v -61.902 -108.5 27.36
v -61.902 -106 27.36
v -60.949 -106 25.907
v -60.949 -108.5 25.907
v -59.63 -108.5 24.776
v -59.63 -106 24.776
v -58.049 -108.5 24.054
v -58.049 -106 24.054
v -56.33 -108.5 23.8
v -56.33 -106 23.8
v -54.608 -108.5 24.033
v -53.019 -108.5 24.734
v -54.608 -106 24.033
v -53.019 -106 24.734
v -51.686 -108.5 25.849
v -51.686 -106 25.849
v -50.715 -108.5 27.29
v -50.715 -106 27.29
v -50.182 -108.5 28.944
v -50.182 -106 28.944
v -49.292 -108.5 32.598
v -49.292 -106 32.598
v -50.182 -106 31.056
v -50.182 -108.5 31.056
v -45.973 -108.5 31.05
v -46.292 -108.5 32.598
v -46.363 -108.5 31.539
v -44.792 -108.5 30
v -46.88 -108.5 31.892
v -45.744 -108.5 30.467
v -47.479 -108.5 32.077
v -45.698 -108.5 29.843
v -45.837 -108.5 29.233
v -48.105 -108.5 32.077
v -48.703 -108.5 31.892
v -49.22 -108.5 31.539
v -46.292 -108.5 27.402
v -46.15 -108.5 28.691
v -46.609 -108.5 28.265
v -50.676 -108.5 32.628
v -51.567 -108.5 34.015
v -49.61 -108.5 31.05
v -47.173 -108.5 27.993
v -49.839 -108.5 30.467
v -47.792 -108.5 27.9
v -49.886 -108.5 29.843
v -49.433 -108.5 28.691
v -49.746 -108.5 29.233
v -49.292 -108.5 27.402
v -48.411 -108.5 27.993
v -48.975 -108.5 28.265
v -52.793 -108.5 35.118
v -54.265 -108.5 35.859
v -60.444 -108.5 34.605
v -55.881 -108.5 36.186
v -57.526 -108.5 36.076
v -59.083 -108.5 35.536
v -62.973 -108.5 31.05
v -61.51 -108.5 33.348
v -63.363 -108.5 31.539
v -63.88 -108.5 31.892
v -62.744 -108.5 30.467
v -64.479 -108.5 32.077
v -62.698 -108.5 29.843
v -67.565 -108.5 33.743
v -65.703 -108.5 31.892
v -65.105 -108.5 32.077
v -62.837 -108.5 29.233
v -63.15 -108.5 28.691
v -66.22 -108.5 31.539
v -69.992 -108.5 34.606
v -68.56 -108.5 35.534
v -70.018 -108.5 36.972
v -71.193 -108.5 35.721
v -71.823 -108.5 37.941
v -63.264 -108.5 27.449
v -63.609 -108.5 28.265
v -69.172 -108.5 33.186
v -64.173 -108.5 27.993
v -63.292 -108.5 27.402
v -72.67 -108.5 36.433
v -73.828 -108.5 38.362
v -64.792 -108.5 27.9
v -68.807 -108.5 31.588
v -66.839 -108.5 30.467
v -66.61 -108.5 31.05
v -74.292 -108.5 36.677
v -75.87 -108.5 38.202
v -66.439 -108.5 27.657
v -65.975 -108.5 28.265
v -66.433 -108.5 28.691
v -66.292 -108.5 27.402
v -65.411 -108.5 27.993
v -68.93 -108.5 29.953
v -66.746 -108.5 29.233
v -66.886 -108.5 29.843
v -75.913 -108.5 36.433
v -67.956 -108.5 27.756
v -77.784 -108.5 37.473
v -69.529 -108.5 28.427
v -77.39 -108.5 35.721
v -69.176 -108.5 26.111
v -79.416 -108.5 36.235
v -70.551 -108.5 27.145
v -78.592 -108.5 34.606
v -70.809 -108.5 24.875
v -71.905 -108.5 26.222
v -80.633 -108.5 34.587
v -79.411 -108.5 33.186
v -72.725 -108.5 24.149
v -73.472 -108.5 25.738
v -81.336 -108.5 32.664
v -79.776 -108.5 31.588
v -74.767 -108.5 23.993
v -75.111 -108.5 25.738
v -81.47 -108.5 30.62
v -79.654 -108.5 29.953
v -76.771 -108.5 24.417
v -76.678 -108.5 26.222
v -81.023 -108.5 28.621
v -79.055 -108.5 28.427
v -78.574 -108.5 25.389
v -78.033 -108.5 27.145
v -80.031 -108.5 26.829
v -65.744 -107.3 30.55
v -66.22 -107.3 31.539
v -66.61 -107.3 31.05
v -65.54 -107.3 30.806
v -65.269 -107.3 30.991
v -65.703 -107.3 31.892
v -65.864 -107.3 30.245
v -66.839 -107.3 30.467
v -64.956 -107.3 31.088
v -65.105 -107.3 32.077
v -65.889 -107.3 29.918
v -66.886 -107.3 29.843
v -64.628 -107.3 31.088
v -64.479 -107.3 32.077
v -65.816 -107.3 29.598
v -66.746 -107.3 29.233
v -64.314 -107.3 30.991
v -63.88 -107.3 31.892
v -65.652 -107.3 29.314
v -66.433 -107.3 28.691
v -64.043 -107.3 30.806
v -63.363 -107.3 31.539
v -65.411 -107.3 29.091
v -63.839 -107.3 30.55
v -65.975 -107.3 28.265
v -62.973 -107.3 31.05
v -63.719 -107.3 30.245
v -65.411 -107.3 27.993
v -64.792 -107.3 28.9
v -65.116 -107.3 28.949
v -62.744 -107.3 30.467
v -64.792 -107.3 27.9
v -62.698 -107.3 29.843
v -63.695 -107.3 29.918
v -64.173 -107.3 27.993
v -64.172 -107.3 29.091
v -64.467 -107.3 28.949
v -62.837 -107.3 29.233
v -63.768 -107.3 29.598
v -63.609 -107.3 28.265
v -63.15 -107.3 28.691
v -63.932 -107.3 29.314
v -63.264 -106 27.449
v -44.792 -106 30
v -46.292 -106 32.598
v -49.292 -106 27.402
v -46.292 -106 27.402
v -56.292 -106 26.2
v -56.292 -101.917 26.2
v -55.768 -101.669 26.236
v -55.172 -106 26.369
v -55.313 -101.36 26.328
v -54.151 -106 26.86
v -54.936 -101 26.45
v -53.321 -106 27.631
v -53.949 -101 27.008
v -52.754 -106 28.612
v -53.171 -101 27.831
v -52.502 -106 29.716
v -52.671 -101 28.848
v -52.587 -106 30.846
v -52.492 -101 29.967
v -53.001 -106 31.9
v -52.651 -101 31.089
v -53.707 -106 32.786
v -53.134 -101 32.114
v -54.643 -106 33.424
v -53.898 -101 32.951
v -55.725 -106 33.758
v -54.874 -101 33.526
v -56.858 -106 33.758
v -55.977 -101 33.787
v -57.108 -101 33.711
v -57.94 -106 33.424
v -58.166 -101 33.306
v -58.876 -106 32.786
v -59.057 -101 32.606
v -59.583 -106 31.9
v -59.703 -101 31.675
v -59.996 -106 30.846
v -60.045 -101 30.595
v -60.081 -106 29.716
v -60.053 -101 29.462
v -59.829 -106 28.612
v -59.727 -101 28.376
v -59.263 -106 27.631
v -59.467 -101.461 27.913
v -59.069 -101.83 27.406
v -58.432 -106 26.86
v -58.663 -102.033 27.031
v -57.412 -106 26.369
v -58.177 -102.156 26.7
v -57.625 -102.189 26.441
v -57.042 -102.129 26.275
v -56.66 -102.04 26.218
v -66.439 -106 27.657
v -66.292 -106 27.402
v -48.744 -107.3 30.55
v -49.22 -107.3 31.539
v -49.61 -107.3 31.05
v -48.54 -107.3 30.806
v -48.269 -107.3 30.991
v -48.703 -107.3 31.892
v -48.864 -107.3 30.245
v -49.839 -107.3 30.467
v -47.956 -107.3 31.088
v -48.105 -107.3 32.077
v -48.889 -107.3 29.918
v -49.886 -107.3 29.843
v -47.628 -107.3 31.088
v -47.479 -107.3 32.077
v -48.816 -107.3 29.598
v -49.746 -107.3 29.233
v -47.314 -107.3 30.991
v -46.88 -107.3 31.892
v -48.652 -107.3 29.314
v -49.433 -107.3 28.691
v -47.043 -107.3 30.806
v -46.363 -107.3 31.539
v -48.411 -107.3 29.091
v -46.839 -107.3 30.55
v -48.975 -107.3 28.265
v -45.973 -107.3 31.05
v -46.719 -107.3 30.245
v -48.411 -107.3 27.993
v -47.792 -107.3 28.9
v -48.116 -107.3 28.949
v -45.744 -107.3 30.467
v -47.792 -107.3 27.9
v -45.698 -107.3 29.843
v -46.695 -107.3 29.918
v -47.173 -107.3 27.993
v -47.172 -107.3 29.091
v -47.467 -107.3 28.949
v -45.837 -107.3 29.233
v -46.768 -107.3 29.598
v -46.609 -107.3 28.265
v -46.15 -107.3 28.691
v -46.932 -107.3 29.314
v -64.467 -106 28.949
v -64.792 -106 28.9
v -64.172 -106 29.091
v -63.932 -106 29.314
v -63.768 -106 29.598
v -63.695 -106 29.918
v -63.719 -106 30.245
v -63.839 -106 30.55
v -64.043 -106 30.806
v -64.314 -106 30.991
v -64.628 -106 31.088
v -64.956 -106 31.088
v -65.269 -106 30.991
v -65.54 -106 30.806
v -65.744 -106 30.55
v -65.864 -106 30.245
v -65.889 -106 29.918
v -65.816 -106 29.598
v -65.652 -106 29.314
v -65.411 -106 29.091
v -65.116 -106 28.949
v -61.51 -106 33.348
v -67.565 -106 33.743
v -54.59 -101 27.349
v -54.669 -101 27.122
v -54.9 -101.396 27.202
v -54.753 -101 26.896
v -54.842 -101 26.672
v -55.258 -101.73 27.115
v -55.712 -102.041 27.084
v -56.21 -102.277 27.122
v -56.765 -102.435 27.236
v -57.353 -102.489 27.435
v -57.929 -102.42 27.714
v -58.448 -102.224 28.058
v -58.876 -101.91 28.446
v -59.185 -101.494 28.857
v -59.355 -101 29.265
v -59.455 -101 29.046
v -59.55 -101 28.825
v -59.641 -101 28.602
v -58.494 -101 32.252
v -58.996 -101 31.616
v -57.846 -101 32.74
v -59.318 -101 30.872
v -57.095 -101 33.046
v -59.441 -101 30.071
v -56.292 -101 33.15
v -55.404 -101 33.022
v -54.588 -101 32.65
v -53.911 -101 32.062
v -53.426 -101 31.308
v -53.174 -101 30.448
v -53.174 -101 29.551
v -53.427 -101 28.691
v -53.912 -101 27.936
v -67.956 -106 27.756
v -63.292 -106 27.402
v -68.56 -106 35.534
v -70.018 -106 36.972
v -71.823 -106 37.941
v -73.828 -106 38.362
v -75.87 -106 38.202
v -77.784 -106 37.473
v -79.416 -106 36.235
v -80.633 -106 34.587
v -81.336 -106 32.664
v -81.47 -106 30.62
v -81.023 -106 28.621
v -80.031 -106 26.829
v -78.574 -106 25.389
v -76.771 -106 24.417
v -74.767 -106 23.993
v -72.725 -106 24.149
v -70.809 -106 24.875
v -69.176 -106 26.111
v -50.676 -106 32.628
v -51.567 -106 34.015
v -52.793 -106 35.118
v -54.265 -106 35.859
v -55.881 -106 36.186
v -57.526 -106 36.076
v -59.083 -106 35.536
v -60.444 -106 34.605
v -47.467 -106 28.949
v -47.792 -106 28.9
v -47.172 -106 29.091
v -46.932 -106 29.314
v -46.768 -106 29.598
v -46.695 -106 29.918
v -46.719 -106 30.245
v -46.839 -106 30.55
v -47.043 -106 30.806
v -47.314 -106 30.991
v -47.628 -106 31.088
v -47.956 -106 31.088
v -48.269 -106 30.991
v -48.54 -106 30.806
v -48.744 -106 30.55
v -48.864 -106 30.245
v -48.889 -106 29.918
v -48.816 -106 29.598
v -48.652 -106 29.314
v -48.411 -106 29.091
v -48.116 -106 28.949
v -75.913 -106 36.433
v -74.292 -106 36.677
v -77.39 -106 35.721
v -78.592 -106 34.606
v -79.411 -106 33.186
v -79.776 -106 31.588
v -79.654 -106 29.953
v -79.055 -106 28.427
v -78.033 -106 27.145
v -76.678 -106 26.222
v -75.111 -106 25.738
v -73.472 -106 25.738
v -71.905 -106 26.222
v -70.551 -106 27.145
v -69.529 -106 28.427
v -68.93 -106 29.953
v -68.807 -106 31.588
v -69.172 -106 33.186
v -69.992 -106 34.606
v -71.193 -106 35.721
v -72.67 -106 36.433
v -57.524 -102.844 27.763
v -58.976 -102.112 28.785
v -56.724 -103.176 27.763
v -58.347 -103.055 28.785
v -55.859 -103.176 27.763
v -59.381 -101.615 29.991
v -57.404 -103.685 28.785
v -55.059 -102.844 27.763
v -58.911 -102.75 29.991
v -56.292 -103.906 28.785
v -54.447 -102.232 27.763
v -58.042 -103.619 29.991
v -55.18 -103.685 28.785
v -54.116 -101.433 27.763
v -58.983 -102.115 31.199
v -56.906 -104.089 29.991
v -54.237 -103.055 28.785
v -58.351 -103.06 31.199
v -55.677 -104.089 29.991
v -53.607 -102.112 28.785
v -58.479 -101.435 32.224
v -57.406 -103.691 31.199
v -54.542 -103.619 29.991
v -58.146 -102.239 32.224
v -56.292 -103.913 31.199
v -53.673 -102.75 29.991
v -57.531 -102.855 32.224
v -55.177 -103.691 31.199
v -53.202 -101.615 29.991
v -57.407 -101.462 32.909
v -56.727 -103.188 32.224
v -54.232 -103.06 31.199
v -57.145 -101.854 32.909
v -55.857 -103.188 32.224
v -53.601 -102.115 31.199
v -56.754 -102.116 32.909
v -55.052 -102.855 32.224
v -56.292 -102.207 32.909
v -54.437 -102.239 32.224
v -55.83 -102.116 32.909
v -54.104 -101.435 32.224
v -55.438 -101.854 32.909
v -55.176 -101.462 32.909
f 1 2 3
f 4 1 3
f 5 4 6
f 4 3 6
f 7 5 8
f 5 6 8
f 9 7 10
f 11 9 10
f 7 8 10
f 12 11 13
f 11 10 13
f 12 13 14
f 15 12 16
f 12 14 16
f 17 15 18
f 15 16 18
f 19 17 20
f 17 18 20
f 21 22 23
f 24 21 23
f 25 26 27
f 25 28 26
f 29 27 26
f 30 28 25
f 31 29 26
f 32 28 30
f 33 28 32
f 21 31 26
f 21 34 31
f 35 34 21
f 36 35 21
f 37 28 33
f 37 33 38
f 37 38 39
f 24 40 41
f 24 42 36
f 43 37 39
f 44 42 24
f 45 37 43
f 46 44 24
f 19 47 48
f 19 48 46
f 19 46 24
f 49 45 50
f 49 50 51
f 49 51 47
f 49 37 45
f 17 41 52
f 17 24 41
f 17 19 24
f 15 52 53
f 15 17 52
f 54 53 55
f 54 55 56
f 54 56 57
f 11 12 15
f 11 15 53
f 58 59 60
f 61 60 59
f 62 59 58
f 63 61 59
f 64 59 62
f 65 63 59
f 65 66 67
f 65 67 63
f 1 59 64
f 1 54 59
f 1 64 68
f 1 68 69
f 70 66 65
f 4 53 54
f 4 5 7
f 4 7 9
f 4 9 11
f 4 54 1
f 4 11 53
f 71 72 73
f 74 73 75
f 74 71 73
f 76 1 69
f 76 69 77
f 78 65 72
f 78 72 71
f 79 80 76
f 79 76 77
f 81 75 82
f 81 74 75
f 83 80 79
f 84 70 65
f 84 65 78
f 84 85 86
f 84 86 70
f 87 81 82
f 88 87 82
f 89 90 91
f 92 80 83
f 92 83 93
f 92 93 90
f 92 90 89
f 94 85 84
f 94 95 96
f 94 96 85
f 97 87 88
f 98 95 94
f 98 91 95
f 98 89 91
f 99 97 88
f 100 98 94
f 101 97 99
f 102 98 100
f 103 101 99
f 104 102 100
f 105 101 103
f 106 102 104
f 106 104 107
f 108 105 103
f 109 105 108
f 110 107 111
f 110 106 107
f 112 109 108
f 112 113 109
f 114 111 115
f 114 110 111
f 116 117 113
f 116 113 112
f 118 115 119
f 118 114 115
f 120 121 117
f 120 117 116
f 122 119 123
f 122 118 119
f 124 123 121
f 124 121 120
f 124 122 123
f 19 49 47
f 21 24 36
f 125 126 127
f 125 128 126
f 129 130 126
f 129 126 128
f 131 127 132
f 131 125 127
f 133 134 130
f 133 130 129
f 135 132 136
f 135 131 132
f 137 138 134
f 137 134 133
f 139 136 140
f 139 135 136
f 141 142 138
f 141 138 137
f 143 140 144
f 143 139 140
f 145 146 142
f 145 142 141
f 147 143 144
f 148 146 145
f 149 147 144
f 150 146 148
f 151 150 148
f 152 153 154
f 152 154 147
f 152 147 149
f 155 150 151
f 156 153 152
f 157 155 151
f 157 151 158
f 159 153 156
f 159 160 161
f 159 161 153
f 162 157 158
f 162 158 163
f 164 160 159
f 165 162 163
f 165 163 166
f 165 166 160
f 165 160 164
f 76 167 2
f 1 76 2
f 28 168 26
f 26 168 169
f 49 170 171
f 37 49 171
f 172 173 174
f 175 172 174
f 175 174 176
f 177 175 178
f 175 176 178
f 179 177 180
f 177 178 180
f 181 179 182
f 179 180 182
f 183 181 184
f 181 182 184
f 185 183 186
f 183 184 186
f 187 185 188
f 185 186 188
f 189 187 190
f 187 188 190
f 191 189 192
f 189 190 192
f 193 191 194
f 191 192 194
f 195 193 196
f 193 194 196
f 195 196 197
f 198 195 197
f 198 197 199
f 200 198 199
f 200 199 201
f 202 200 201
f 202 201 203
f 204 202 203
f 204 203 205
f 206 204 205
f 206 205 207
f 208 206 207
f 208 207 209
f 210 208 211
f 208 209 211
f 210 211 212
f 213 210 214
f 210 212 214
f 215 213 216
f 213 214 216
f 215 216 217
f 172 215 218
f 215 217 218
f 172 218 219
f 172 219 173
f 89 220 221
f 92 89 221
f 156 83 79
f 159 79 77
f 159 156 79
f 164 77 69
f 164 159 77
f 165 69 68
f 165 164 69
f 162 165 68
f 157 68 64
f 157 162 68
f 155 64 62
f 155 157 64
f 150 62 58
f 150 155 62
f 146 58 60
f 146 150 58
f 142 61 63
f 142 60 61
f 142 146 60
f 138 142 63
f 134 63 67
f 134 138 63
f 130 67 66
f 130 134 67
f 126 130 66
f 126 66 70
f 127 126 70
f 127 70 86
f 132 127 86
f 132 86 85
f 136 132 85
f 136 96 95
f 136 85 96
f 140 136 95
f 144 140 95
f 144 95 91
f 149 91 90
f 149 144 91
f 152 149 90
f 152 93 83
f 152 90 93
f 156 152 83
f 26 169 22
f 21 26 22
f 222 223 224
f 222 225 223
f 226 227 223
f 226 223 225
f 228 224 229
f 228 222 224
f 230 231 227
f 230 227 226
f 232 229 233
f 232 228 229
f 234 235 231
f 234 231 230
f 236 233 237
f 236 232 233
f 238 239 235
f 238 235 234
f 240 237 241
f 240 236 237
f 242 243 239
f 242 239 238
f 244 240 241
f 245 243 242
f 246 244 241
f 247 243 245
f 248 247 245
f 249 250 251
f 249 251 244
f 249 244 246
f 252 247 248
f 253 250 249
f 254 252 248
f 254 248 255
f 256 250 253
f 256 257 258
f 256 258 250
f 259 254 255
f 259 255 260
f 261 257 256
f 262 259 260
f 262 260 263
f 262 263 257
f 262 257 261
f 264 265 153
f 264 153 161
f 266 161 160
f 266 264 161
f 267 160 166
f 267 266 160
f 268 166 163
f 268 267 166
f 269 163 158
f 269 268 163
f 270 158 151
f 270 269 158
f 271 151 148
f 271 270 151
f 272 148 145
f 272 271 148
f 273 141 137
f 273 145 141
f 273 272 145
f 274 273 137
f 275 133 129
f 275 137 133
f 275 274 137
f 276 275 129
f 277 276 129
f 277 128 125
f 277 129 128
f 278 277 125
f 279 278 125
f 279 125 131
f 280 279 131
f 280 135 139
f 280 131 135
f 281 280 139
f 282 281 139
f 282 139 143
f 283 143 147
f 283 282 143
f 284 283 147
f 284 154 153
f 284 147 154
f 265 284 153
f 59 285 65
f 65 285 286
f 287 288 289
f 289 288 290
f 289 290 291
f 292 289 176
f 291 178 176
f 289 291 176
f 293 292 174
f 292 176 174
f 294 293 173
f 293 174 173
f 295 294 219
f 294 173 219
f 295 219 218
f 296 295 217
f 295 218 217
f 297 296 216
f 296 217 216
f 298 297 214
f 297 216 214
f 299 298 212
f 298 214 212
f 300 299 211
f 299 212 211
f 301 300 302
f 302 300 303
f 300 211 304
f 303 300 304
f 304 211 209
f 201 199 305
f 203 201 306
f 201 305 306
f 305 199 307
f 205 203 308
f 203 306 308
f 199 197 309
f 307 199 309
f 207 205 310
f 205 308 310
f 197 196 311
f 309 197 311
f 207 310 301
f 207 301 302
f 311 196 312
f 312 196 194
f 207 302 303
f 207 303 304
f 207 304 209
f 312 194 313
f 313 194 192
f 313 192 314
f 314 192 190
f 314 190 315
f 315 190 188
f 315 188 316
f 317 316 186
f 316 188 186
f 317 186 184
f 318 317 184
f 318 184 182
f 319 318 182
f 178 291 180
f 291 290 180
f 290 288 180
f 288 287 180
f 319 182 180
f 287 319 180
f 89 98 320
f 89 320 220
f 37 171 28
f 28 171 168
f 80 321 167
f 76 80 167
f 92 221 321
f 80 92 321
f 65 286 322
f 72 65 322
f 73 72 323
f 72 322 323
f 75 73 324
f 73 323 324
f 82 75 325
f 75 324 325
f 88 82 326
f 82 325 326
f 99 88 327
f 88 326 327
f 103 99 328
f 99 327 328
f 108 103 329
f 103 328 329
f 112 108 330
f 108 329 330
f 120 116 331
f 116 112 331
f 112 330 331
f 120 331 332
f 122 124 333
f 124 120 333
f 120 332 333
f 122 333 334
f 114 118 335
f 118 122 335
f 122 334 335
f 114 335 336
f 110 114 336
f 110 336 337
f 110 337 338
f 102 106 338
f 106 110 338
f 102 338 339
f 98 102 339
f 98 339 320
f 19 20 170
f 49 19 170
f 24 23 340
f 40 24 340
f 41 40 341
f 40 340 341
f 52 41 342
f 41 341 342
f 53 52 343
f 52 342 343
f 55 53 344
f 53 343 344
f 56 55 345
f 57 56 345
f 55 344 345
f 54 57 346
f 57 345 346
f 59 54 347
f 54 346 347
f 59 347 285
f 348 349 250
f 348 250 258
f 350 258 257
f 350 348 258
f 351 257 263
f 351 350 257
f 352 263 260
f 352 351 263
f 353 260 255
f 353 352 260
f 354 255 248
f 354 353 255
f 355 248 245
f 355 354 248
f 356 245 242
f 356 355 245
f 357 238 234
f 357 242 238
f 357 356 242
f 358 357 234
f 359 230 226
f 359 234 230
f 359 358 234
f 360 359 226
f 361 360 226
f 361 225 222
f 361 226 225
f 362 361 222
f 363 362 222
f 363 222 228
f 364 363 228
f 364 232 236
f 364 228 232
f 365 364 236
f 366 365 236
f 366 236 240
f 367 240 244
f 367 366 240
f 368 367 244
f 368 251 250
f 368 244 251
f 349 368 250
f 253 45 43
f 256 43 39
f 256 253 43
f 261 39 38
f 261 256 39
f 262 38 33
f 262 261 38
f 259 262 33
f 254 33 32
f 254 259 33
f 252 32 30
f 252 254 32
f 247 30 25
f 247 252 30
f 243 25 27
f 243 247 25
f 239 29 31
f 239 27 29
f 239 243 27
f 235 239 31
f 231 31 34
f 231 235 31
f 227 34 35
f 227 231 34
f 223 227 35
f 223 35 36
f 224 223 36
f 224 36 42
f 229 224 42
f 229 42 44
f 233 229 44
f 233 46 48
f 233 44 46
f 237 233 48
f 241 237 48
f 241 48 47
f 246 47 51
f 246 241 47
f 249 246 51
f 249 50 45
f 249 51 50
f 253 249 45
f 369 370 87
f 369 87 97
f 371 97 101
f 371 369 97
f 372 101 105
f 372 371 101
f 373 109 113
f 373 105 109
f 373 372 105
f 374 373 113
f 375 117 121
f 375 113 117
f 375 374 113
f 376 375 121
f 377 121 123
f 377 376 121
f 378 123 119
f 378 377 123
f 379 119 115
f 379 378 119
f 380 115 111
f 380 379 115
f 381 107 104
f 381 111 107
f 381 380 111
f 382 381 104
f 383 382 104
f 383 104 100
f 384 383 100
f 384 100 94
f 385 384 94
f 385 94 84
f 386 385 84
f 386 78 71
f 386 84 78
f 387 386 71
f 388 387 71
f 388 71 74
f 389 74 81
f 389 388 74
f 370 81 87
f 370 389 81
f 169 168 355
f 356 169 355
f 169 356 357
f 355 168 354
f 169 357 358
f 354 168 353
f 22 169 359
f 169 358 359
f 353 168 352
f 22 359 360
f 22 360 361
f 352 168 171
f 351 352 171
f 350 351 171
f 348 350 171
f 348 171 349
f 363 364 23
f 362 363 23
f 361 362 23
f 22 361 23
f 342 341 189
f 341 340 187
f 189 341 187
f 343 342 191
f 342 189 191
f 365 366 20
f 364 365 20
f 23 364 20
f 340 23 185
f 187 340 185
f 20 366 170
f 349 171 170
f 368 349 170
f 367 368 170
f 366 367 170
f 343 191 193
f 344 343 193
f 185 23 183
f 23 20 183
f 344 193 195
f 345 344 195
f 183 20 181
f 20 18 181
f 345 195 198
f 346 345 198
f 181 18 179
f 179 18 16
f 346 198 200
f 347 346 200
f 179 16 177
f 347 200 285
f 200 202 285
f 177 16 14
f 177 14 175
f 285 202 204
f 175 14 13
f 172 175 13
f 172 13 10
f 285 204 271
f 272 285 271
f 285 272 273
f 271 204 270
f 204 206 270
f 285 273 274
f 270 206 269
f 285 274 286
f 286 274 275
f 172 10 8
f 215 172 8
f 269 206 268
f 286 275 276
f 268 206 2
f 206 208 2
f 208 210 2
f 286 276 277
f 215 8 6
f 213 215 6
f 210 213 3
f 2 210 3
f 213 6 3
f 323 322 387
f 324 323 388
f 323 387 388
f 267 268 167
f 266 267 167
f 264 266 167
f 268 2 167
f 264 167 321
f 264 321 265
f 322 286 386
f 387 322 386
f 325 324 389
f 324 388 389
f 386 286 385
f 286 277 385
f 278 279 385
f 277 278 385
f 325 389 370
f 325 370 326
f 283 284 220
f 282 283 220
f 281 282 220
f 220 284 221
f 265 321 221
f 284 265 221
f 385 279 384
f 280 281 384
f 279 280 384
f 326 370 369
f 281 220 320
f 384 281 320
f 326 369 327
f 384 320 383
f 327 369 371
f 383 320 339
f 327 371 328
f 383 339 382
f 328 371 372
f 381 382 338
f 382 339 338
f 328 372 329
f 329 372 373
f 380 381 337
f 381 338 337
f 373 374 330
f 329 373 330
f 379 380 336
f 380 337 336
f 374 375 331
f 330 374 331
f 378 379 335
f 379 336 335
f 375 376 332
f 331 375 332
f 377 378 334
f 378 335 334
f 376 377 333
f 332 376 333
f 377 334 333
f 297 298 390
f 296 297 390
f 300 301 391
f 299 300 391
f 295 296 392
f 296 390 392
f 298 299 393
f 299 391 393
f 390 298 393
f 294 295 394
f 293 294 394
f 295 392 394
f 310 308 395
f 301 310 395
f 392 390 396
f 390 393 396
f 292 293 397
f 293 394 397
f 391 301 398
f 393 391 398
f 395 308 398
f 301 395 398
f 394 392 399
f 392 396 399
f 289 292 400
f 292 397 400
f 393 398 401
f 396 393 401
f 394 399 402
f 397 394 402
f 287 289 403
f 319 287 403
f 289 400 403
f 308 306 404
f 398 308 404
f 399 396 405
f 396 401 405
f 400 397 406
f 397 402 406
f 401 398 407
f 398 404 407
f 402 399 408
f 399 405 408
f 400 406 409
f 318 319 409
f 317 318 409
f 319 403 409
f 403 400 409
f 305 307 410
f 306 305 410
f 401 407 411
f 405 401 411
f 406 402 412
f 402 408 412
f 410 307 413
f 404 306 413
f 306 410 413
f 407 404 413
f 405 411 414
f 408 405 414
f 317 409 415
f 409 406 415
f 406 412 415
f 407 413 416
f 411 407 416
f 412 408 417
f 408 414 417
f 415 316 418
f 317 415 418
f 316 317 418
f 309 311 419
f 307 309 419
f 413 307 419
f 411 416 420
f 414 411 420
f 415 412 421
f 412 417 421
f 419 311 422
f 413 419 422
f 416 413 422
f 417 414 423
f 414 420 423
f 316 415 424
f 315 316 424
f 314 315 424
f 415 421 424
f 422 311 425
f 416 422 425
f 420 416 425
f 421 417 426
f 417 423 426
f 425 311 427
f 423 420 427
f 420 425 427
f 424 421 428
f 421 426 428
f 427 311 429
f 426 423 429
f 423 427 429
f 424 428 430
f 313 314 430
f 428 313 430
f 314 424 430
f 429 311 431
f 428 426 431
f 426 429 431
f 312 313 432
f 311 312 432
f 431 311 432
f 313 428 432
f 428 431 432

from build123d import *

# Parameters (mm, degrees)
RETAINER_FEATURE_1_PROFILE_R  = 3.8
RETAINER_FEATURE_1_DEPTH      = 5.02
RETAINER_FEATURE_2_PROFILE_R  = 6.2
RETAINER_FEATURE_2_DEPTH      = 2.5
RETAINER_FEATURE_5_DEPTH      = 2.5
RETAINER_FEATURE_8_DEPTH      = 2.5
RETAINER_FEATURE_12_DEPTH     = 2.5
RETAINER_FEATURE_13_PROFILE_R = 7.2
RETAINER_FEATURE_13_DEPTH     = 2.5
RETAINER_FEATURE_14_PROFILE_R = 5.5
RETAINER_FEATURE_14_DEPTH     = 2.7
RETAINER_FEATURE_15_PROFILE_R = 1.1
RETAINER_FEATURE_15_DEPTH     = 3.75
RETAINER_FEATURE_16_PROFILE_R = 2.1
RETAINER_FEATURE_16_DEPTH     = 1.45
RETAINER_FEATURE_17_PROFILE_R = 1.1
RETAINER_FEATURE_17_DEPTH     = 3.75
RETAINER_FEATURE_18_PROFILE_R = 2.1
RETAINER_FEATURE_18_DEPTH     = 1.45


with BuildPart() as part:
    # Retainer Feature 1 profile → Retainer Feature 1 (new body)
    with BuildSketch(Plane(origin=(0, -101, 0), x_dir=(-1, 0, 0), z_dir=(0, -1, 0))):
        with Locations(Location((56.291651246, -30, 0), (0, 0, 90))):
            Circle(RETAINER_FEATURE_1_PROFILE_R)
    extrude(amount=RETAINER_FEATURE_1_DEPTH)

    # Retainer Feature 2 profile → Retainer Feature 2 (add)
    with BuildSketch(Plane(origin=(0, -106, 0), x_dir=(-1, 0, 0), z_dir=(0, -1, 0))):
        with Locations(Location((56.291651246, -30, 0), (0, 0, 90))):
            Circle(RETAINER_FEATURE_2_PROFILE_R)
    extrude(amount=RETAINER_FEATURE_2_DEPTH)

    # Middle Right Floating Compression Ball R → Retainer Feature 5 (add)
    with BuildSketch(Plane(origin=(0, -106, 0), x_dir=(-1, 0, 0), z_dir=(0, -1, 0))):
        Polygon((44.791651246, -30), (46.291651246, -32.598076211), (49.291651246, -32.598076211), (50.791651246, -30), (49.291651246, -27.401923789), (46.291651246, -27.401923789), align=None)
    extrude(amount=RETAINER_FEATURE_5_DEPTH)

    # Middle Right Floating Compression Ba 2 → Retainer Feature 8 (add)
    with BuildSketch(Plane(origin=(0, -106, 0), x_dir=(-1, 0, 0), z_dir=(0, -1, 0))):
        Polygon((61.791651246, -30), (63.291651246, -32.598076211), (66.291651246, -32.598076211), (67.791651246, -30), (66.291651246, -27.401923789), (63.291651246, -27.401923789), align=None)
    extrude(amount=RETAINER_FEATURE_8_DEPTH)

    # Retainer Feature 9 profile → Retainer Feature 9 (revolve, cut)
    with BuildSketch(Plane(origin=(0, -101, 0), x_dir=(-1, 0, 0), z_dir=(0, -1, 0))):
        with BuildLine():
            Line((56.291651246, -33.15), (56.291651246, -26.85))
            ThreePointArc((56.291651246, -26.85), (53.141651246, -30), (56.291651246, -33.15))
        make_face()
    revolve(axis=Axis((-56.291651246, -101, 20), (0, 0, 1)), mode=Mode.SUBTRACT)

    # Middle Right Floating Compression Ba 3 → Retainer Feature 12 (add)
    with BuildSketch(Plane(origin=(0, -106, 0), x_dir=(-1, 0, 0), z_dir=(0, -1, 0))):
        Polygon((56.095916768, -32.993607859), (74.095916768, -34.170522395), (74.487385724, -28.183306677), (56.487385724, -27.006392141), align=None)
    extrude(amount=RETAINER_FEATURE_12_DEPTH)

    # Retainer Feature 13 profile → Retainer Feature 13 (add)
    with BuildSketch(Plane(origin=(0, -106, 0), x_dir=(-1, 0, 0), z_dir=(0, -1, 0))):
        with Locations((74.291651246, -31.176914536)):
            Circle(RETAINER_FEATURE_13_PROFILE_R)
    extrude(amount=RETAINER_FEATURE_13_DEPTH)

    # Retainer Feature 14 profile → Retainer Feature 14 (cut)
    with BuildSketch(Plane(origin=(0, -105.9, 0), x_dir=(-1, 0, 0), z_dir=(0, -1, 0))):
        with Locations(Location((74.291651246, -31.176914536, 0), (0, 0, 270))):
            Circle(RETAINER_FEATURE_14_PROFILE_R)
    extrude(amount=RETAINER_FEATURE_14_DEPTH, mode=Mode.SUBTRACT)

    # Retainer Feature 15 profile → Retainer Feature 15 (cut)
    with BuildSketch(Plane(origin=(0, -105, 0), x_dir=(-1, 0, 0), z_dir=(0, -1, 0))):
        with Locations(Location((47.791651246, -30, 0), (0, 0, 90))):
            Circle(RETAINER_FEATURE_15_PROFILE_R)
    extrude(amount=RETAINER_FEATURE_15_DEPTH, mode=Mode.SUBTRACT)

    # Retainer Feature 16 profile → Retainer Feature 16 (cut)
    with BuildSketch(Plane(origin=(0, -107.3, 0), x_dir=(-1, 0, 0), z_dir=(0, -1, 0))):
        with Locations(Location((47.791651246, -30, 0), (0, 0, 90))):
            Circle(RETAINER_FEATURE_16_PROFILE_R)
    extrude(amount=RETAINER_FEATURE_16_DEPTH, mode=Mode.SUBTRACT)

    # Retainer Feature 17 profile → Retainer Feature 17 (cut)
    with BuildSketch(Plane(origin=(0, -105, 0), x_dir=(-1, 0, 0), z_dir=(0, -1, 0))):
        with Locations(Location((64.791651246, -30, 0), (0, 0, 90))):
            Circle(RETAINER_FEATURE_17_PROFILE_R)
    extrude(amount=RETAINER_FEATURE_17_DEPTH, mode=Mode.SUBTRACT)

    # Retainer Feature 18 profile → Retainer Feature 18 (cut)
    with BuildSketch(Plane(origin=(0, -107.3, 0), x_dir=(-1, 0, 0), z_dir=(0, -1, 0))):
        with Locations(Location((64.791651246, -30, 0), (0, 0, 90))):
            Circle(RETAINER_FEATURE_18_PROFILE_R)
    extrude(amount=RETAINER_FEATURE_18_DEPTH, mode=Mode.SUBTRACT)

    # Articulation Throat Sketch → Articulation Throat (revolve, cut)
    with BuildSketch(Plane(origin=(-75.19414337, -14.119516346, 20.509419779), x_dir=(-0.2544785459472912, -0.04778449262394895, -0.9658971539026421), z_dir=(0.9493062747008634, 0.17825517869277502, -0.2589260282064664))):
        Polygon((-9.825663304, -88.876600419), (-8.475389129, -90.738524062), (14.088996194, -82.675837476), (8.793573125, -75.373858667), align=None)
    revolve(axis=Axis((-53.148124615, -106.383086561, 37.819246728), (-0.3143526631246646, 0.5383086561091633, -0.781924672807028)), mode=Mode.SUBTRACT)


solid = part.part
